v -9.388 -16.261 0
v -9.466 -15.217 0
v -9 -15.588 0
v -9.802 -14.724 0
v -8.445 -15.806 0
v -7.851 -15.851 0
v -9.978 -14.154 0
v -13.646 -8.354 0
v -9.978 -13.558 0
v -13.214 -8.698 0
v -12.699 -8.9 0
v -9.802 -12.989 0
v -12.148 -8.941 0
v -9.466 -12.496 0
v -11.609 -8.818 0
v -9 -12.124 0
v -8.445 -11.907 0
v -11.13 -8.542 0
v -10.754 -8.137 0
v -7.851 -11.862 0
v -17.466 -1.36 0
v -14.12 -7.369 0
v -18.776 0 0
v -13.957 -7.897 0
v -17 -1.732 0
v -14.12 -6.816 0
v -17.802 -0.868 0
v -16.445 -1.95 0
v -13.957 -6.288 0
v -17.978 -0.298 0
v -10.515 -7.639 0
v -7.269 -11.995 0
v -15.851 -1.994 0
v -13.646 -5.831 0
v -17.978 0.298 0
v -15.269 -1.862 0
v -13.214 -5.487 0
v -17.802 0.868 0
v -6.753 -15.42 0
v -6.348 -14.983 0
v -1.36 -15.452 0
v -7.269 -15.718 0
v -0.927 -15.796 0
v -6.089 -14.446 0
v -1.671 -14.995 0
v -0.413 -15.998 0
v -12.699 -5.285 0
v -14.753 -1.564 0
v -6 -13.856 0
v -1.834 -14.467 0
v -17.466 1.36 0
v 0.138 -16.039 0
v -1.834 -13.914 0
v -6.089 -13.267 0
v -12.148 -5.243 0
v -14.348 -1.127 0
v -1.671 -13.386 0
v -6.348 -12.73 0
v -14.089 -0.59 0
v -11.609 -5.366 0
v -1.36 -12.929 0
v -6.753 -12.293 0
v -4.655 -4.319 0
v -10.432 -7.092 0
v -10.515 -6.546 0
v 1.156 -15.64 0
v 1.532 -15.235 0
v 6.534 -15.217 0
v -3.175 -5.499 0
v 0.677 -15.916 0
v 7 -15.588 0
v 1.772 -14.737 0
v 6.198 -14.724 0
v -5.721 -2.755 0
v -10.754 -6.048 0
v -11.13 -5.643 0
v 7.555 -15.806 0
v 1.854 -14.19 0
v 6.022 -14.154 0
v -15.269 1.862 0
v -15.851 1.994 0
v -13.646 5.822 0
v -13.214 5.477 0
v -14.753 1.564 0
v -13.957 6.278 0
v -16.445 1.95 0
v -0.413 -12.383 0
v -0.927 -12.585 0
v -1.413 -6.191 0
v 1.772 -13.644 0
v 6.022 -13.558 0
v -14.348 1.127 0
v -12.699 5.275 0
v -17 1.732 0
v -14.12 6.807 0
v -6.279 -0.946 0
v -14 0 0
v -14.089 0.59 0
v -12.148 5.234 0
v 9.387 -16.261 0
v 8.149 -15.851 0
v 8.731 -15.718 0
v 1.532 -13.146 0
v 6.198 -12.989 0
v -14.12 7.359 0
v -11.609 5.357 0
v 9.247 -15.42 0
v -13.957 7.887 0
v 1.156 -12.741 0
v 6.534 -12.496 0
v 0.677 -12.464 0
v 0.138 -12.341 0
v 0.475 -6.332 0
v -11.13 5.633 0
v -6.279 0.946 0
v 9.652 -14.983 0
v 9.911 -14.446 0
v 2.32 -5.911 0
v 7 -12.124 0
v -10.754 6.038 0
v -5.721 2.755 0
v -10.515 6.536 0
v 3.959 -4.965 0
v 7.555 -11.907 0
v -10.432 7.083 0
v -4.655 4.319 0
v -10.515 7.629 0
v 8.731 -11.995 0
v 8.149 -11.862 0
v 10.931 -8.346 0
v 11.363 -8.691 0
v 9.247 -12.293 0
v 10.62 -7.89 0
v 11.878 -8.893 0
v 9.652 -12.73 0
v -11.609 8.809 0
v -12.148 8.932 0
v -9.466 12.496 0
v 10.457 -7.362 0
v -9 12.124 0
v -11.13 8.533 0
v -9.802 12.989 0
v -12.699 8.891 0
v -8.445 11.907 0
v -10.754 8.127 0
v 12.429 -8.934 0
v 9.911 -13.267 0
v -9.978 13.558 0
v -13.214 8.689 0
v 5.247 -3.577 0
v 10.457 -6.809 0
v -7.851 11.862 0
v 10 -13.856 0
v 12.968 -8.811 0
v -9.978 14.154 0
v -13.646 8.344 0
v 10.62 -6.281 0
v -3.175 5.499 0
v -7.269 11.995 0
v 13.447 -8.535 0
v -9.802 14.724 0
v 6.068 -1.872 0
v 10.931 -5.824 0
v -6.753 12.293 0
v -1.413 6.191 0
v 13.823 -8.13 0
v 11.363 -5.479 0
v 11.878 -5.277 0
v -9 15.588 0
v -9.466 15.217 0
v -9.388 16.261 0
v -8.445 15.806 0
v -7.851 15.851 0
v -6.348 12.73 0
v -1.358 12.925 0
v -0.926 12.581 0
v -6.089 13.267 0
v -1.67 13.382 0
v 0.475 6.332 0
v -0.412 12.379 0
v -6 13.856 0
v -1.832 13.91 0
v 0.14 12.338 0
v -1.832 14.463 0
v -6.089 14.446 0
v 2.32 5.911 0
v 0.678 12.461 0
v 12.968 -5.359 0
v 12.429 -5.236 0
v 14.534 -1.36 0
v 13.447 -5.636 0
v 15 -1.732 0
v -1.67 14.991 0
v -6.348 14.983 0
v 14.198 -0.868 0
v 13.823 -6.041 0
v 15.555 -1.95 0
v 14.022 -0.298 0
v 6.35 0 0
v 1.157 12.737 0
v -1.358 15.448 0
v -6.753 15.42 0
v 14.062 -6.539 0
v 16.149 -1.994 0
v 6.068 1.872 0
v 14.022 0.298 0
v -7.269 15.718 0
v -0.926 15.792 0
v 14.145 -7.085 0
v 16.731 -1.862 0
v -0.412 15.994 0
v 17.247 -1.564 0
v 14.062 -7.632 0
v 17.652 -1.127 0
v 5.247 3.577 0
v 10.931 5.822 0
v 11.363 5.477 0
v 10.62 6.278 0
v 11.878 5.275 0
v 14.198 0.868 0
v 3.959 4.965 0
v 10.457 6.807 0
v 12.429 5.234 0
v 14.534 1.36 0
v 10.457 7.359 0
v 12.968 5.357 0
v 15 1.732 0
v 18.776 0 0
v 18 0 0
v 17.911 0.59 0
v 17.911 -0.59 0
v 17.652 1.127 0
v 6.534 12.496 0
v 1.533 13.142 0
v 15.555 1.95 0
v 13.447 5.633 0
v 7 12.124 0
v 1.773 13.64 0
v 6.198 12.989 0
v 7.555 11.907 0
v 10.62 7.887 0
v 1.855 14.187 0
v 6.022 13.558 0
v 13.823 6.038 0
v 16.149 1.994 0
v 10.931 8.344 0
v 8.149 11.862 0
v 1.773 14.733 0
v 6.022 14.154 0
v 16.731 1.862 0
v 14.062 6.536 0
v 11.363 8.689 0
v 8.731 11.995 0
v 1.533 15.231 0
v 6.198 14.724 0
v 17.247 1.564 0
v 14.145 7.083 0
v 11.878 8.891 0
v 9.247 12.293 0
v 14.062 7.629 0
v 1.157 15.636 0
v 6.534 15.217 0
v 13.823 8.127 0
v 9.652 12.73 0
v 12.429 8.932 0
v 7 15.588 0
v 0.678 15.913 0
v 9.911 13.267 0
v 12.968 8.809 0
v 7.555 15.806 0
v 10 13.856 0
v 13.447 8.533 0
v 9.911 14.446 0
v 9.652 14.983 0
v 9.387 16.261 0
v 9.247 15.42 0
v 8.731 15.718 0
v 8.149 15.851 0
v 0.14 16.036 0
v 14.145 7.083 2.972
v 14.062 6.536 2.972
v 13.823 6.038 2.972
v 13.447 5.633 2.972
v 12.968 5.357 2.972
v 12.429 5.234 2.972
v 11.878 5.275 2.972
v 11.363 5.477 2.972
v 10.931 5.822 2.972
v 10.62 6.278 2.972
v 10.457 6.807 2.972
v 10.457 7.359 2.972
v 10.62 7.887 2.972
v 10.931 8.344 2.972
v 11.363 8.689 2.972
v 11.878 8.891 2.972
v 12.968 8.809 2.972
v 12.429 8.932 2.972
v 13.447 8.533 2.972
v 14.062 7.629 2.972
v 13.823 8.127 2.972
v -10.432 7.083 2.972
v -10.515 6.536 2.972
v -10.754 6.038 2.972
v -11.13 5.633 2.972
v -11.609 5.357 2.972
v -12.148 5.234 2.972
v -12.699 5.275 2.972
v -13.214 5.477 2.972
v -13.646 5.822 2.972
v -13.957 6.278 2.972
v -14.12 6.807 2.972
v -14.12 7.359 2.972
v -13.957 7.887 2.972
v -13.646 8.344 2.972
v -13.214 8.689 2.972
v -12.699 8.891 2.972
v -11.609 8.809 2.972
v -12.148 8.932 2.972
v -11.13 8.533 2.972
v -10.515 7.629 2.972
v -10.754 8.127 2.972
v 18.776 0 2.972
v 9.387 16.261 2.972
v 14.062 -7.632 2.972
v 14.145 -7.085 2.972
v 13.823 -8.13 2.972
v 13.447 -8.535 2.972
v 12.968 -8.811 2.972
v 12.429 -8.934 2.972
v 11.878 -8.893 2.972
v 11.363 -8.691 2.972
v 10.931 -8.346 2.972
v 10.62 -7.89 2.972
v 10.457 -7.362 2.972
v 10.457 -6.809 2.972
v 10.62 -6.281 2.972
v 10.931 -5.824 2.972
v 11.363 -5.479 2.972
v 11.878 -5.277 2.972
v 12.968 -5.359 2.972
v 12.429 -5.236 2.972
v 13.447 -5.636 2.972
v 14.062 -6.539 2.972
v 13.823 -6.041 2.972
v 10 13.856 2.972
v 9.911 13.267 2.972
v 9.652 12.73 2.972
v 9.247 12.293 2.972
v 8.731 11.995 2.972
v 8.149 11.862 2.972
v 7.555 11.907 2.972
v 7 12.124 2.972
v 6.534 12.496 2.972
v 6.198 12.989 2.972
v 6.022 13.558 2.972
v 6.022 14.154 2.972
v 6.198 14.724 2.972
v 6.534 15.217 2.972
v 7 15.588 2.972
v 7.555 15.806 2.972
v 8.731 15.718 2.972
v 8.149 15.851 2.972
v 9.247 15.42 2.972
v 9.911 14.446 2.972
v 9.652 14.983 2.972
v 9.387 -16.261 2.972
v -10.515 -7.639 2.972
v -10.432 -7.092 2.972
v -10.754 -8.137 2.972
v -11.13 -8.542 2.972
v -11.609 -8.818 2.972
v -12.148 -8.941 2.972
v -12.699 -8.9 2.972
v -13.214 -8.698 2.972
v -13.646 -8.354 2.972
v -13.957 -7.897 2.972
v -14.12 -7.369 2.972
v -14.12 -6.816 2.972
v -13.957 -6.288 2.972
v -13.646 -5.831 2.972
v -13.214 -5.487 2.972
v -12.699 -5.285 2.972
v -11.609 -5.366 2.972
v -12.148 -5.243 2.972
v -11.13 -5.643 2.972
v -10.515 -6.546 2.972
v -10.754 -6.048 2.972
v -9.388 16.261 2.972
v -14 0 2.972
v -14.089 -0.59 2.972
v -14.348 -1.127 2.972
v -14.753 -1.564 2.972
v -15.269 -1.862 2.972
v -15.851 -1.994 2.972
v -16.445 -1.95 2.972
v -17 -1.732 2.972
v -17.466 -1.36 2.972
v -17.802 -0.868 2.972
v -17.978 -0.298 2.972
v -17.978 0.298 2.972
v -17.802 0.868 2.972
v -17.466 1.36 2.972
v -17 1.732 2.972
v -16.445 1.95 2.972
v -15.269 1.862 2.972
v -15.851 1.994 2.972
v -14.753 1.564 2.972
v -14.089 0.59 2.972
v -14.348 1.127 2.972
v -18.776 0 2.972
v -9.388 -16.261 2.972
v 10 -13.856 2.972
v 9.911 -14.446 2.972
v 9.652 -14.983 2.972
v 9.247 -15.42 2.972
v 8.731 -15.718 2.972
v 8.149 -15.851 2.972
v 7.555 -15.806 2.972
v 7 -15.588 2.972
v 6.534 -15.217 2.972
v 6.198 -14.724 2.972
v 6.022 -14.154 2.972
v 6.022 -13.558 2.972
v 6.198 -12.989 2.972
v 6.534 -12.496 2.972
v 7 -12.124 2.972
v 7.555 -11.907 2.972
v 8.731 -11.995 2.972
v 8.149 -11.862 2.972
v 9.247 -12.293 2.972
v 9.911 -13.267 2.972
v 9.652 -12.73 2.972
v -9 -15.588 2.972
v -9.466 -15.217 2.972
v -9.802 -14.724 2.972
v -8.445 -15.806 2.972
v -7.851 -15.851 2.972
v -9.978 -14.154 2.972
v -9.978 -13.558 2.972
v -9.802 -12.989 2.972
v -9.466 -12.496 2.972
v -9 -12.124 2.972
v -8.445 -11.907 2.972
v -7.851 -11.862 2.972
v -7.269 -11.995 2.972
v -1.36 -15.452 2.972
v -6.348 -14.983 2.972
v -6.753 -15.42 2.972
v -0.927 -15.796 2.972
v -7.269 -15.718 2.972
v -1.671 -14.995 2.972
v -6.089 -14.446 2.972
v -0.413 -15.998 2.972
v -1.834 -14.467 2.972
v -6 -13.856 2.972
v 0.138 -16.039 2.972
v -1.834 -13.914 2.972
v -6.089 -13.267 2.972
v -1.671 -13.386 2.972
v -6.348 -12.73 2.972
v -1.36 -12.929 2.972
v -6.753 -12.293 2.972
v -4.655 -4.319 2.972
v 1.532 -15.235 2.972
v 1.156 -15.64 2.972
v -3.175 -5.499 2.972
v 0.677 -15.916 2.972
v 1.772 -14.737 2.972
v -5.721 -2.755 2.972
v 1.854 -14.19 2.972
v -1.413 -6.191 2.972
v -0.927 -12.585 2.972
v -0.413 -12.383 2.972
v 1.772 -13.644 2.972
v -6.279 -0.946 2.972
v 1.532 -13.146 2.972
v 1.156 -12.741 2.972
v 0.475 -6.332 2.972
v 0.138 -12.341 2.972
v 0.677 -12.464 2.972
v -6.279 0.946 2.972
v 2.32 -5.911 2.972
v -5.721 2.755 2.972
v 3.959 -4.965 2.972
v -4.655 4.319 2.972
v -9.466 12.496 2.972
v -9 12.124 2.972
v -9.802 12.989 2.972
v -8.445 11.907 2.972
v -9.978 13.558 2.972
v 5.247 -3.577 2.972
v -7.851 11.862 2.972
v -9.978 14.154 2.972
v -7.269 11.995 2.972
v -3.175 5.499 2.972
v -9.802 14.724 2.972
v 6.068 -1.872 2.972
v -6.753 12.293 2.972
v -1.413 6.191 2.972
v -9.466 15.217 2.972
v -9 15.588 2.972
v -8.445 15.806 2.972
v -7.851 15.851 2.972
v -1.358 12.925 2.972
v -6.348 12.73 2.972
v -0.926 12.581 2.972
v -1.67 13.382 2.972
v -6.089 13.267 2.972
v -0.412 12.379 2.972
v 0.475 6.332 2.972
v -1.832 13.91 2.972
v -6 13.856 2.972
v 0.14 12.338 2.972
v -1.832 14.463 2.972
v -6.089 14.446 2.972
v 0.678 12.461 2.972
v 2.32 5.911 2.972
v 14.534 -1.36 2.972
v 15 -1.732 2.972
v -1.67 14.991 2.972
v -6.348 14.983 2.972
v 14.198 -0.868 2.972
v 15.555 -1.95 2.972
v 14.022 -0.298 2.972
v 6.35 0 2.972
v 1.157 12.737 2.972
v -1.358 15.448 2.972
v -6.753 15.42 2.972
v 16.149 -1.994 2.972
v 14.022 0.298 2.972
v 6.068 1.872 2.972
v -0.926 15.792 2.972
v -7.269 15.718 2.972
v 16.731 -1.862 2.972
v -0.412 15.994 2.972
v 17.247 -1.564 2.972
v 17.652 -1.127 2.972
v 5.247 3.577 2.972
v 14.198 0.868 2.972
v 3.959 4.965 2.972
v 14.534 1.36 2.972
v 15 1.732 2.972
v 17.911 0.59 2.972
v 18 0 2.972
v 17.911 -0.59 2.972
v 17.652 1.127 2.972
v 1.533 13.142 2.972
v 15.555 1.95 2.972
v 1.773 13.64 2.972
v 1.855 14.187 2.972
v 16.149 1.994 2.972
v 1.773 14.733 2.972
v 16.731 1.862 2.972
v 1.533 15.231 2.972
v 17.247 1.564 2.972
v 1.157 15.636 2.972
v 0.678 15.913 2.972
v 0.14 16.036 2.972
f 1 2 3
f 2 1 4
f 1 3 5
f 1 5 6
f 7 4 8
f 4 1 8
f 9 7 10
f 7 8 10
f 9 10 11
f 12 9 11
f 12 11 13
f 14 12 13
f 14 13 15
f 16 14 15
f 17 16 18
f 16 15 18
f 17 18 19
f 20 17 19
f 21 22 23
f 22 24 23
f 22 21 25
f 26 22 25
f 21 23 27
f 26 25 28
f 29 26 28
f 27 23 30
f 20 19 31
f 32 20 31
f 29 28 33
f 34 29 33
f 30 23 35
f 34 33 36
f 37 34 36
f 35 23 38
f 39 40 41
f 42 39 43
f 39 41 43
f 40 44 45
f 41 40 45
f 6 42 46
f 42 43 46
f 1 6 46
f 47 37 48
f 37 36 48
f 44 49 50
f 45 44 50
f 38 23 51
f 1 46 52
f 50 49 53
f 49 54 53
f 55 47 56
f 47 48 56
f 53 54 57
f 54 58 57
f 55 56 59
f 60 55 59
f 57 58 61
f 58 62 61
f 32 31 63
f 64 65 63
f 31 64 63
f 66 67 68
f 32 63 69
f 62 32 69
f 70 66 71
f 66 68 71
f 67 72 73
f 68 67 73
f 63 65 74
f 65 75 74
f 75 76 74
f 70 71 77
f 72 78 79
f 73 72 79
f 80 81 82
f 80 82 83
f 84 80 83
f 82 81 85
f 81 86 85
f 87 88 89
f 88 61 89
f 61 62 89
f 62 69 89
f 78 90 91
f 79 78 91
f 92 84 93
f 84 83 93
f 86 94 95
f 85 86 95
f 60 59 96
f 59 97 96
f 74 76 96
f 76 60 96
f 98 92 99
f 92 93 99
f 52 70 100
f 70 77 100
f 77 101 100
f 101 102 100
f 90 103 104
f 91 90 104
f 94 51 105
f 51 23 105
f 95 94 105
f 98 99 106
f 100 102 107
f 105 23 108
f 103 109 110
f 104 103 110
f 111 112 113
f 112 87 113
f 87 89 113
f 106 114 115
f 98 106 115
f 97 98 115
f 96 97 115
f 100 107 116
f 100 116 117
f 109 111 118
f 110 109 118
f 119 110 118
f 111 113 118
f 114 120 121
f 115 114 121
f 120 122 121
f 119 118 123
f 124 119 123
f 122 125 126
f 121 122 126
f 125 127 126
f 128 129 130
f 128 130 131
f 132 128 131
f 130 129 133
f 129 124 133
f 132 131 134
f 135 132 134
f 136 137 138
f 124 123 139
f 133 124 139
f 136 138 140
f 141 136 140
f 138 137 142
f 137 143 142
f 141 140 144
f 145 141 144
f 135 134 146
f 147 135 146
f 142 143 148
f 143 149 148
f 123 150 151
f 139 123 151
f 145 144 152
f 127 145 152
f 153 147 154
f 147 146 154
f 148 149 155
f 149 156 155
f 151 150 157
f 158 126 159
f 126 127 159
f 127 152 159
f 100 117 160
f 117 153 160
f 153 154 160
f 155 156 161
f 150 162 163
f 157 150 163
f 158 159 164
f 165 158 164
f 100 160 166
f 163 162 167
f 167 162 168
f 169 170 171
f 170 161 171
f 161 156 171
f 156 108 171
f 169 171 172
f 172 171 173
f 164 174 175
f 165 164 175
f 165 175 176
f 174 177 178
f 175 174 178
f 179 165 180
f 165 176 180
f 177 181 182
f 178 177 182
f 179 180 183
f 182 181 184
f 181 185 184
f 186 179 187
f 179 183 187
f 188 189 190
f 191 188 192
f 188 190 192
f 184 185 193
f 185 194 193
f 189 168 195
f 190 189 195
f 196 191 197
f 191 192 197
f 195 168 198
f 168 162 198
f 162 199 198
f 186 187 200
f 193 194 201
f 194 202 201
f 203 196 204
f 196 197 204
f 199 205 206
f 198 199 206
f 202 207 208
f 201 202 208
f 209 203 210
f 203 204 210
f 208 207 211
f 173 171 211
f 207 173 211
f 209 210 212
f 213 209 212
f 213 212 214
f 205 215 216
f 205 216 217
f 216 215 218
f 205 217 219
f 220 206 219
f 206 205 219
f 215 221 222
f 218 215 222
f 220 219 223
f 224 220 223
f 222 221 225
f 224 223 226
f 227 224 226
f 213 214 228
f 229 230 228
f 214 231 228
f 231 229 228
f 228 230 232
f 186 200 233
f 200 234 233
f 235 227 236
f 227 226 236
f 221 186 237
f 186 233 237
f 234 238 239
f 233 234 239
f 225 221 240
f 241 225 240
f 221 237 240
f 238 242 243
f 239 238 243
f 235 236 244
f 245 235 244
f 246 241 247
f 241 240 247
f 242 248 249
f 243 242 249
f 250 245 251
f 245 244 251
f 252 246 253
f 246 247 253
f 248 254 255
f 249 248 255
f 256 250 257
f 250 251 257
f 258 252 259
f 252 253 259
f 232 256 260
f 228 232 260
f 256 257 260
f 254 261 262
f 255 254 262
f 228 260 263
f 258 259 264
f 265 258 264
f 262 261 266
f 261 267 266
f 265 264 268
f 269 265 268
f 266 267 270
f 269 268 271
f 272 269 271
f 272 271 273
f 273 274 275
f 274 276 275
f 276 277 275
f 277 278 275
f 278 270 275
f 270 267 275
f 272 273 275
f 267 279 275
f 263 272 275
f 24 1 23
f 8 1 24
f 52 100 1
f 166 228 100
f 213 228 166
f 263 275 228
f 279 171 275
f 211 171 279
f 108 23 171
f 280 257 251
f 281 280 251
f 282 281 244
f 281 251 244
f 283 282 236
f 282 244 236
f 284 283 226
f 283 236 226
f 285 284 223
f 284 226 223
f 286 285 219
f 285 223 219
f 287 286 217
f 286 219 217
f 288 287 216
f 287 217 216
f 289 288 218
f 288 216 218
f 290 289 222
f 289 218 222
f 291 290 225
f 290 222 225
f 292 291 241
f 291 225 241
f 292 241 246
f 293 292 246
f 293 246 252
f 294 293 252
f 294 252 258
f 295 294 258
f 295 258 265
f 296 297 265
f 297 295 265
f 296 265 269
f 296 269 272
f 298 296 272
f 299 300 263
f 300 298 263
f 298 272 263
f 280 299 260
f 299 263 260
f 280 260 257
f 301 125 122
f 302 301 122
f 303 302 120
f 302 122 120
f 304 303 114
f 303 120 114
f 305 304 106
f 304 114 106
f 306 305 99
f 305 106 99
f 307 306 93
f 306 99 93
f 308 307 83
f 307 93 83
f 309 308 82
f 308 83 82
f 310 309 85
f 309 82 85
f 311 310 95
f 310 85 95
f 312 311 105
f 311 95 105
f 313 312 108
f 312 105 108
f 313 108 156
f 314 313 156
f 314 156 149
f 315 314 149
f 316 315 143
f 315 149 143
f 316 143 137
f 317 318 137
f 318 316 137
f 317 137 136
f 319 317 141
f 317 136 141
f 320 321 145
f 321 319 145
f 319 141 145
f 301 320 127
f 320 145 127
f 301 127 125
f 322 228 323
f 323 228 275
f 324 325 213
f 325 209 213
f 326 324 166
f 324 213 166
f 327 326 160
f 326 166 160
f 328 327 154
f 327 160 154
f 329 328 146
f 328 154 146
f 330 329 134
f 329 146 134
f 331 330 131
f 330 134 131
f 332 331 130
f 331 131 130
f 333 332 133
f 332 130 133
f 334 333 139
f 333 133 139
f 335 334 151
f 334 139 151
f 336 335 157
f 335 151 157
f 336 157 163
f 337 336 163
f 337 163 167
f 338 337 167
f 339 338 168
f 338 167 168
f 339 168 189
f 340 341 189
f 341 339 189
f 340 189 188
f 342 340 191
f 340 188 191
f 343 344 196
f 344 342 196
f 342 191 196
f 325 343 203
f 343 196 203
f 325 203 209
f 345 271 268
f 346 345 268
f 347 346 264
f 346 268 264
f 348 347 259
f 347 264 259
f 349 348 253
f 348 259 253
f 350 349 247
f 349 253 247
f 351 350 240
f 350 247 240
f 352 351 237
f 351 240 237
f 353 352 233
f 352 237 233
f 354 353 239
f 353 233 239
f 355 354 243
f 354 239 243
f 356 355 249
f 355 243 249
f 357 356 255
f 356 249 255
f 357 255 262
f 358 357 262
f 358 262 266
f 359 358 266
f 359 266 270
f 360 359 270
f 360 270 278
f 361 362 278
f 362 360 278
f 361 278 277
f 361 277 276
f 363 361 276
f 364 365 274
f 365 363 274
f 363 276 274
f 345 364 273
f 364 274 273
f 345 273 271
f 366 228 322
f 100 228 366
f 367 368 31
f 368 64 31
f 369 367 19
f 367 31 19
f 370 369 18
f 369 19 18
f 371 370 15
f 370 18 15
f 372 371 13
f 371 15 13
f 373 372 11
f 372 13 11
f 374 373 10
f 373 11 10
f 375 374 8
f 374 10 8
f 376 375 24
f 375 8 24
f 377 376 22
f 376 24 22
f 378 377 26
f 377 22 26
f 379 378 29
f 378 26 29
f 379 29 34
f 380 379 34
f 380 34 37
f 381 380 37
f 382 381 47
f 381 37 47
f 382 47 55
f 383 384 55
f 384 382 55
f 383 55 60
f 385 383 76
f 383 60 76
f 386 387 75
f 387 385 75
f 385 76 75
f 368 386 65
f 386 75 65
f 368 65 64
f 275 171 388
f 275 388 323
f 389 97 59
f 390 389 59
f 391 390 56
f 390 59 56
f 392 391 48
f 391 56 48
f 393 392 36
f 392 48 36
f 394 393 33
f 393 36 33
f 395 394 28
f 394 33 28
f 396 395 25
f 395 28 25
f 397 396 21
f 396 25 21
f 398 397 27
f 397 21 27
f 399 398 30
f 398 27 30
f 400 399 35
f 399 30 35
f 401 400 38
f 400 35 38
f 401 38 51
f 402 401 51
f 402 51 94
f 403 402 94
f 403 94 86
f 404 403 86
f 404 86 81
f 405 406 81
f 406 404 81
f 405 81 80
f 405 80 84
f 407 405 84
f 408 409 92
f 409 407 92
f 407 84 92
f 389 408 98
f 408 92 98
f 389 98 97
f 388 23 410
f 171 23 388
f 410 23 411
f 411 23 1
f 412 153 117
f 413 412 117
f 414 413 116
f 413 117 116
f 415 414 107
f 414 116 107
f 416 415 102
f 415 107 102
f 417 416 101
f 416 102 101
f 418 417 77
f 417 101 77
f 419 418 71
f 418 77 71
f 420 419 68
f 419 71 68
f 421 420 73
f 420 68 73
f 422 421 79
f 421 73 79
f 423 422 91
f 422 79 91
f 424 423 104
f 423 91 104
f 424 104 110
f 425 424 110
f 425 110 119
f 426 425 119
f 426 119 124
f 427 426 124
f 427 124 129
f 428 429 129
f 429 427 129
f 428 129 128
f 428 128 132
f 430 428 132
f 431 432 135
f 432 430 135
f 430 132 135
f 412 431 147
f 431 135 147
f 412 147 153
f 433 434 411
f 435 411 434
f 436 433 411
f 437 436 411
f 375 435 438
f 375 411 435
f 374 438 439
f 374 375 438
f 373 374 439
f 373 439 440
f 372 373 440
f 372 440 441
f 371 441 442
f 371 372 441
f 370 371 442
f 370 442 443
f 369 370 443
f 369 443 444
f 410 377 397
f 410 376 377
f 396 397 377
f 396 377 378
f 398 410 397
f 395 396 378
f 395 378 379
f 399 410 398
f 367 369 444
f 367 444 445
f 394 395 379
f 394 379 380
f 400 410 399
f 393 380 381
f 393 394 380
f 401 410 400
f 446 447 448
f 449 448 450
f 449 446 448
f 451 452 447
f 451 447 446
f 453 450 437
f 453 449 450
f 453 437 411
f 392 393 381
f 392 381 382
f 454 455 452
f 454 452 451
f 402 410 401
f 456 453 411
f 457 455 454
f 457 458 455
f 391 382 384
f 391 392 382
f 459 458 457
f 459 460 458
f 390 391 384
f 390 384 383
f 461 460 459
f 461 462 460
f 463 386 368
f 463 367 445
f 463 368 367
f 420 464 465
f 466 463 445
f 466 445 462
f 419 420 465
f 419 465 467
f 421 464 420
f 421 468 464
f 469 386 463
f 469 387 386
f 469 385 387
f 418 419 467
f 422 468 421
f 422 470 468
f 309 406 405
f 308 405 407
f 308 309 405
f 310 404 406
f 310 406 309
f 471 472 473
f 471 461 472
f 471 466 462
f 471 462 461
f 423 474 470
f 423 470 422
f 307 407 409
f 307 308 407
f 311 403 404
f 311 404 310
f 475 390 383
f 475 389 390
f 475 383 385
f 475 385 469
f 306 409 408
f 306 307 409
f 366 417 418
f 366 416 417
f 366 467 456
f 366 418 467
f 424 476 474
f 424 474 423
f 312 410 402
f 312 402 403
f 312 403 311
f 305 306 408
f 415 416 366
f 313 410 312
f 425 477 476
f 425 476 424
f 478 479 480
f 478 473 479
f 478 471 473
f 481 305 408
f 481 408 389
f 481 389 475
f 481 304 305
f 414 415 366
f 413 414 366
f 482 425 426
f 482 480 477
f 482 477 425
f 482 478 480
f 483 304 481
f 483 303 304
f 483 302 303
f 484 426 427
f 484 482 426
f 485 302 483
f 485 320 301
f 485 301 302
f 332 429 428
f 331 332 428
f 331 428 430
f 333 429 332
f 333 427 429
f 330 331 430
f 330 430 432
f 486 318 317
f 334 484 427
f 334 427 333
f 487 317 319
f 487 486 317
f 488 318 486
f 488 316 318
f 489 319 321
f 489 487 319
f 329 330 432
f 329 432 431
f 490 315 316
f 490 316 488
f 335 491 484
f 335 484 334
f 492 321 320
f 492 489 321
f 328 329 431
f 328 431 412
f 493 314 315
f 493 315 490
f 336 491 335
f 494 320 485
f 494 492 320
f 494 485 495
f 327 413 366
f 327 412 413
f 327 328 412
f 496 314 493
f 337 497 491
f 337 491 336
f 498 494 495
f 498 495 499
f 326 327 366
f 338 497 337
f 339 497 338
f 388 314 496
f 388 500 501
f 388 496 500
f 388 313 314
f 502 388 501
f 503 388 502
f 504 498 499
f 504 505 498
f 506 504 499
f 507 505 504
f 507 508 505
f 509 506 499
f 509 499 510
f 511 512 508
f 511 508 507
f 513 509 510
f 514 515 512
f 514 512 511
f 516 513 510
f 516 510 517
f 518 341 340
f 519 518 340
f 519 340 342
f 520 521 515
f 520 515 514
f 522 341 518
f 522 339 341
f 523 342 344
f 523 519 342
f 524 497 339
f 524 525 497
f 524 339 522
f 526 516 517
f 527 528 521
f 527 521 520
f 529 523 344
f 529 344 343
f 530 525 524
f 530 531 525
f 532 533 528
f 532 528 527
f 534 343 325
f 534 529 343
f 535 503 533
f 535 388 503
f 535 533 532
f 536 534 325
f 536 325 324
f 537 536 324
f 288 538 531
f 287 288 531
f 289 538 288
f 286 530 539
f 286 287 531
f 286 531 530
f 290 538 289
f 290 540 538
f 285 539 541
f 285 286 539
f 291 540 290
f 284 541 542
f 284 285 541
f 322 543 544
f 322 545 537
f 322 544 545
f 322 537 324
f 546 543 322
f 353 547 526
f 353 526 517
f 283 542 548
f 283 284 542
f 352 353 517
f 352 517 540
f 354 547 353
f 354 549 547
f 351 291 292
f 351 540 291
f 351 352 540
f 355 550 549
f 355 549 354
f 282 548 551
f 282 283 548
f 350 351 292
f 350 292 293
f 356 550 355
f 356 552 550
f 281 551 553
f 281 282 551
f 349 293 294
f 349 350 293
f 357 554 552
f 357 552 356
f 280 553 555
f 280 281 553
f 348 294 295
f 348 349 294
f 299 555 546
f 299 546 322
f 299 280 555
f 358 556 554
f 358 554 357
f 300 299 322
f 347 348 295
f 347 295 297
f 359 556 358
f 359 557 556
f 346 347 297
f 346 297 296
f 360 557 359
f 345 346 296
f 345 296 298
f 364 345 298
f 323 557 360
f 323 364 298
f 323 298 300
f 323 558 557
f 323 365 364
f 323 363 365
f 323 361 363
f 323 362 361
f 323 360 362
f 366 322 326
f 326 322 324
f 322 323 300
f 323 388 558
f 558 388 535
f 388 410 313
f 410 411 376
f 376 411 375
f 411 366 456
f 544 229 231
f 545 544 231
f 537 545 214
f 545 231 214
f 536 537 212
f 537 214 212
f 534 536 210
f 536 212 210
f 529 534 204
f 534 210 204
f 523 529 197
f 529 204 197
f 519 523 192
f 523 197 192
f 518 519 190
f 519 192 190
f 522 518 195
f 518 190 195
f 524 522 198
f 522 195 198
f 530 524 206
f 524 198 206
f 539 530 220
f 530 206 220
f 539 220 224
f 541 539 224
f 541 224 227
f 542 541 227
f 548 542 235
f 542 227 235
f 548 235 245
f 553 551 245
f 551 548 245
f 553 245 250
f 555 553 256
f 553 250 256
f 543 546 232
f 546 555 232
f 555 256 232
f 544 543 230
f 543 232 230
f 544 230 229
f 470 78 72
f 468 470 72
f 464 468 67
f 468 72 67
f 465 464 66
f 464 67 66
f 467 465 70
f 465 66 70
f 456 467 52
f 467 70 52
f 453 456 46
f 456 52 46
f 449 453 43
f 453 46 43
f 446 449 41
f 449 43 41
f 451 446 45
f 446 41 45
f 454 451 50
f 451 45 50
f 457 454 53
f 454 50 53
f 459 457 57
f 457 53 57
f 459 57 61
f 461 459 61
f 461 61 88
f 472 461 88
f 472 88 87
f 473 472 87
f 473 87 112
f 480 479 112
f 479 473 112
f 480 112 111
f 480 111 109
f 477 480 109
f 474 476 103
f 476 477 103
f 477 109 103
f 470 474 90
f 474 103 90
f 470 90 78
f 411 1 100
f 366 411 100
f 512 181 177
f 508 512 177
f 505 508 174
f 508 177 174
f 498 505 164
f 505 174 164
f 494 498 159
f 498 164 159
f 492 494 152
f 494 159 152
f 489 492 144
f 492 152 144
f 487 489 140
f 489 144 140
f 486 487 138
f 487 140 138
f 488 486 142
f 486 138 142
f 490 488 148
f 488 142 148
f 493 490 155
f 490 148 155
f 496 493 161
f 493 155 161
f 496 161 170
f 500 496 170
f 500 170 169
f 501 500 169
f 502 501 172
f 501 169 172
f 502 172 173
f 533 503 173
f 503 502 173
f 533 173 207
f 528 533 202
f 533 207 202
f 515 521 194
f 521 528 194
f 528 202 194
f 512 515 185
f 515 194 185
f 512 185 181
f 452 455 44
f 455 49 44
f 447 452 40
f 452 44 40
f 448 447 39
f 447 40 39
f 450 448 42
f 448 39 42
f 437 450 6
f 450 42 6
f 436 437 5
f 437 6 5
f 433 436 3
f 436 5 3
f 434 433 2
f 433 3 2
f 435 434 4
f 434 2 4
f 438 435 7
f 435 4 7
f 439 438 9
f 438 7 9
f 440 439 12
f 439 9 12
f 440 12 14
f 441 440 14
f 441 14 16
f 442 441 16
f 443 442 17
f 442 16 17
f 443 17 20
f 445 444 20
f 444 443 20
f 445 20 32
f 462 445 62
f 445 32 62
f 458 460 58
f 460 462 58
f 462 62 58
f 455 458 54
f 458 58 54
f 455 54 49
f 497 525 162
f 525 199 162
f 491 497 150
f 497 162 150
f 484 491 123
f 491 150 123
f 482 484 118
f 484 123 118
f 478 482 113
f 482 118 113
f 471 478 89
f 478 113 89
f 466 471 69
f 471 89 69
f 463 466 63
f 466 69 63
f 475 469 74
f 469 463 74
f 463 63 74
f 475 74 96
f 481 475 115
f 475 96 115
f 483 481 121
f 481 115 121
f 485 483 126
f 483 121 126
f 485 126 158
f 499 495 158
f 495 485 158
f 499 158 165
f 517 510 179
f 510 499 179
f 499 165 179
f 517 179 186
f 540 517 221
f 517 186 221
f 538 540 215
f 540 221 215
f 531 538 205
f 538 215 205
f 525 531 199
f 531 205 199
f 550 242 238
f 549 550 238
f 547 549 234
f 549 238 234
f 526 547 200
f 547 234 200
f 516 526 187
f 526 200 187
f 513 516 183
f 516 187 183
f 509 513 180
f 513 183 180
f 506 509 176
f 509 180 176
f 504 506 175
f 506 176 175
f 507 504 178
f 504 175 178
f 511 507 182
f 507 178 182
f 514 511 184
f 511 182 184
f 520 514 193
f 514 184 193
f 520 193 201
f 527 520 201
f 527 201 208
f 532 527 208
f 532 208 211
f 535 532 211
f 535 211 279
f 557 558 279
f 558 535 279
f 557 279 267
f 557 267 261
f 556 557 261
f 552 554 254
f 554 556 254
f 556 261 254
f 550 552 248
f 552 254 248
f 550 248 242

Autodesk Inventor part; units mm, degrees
ref_plane "YZ Plane" through (0, 0, 0) normal (1, 0, 0) x (0, 1, 0)
ref_plane "XZ Plane" through (0, 0, 0) normal (0, 1, 0) x (-1, 0, 0)
ref_plane "XY Plane" through (0, 0, 0) normal (0, 0, 1) x (1, 0, 0)
sketch "Sketch1" plane through (0, 0, 0) normal (0, 0, 1) x (1, 0, 0)
  line L0 (-9.3881, 16.2606) -> (9.3868, 16.2606)
  line L1 (18.7092, 0.25) -> (18.7092, 0.25)
  line L2 (18.7762, 0) -> (9.3868, 16.2606)
  line L3 (18.7762, 0) -> (9.3868, -16.2606)
  line L4 (-9.3881, -16.2606) -> (9.3868, -16.2606)
  line L5 (-18.7762, 0) -> (-9.3881, -16.2606)
  line L6 (-18.7762, 0) -> (-9.3881, 16.2606)
  circle A0 centre (16, 0) radius 2
  circle A1 centre (8, 13.8564) radius 2
  circle A2 centre (-8, 13.8564) radius 2
  circle A3 centre (-16, 0) radius 2
  circle A4 centre (8, -13.8564) radius 2
  circle A5 centre (-8, -13.8564) radius 2
  circle A6 centre (0, 0) radius 6.35
  circle A7 centre (-0.0003, -14.1904) radius 1.8542
  circle A8 centre (0.001, 14.1866) radius 1.8542
  circle A9 centre (12.2905, 7.0829) radius 1.8542
  circle A10 centre (12.2905, -7.0852) radius 1.8542
  circle A11 centre (-12.2865, -7.0924) radius 1.8542
  circle A12 centre (-12.2865, 7.0829) radius 1.8542
  dimension "d3" = 12.7
  dimension "d4" = 3.7084
  dimension "d5" = 3.7084
  dimension "d6" = 3.7084
  dimension "d7" = 3.7084
  dimension "d8" = 3.7084
  dimension "d9" = 3.7084
extrude "Extrusion1" add sketch "Sketch1" along normal blind 2.9718
properties part number "90d Spacer"
